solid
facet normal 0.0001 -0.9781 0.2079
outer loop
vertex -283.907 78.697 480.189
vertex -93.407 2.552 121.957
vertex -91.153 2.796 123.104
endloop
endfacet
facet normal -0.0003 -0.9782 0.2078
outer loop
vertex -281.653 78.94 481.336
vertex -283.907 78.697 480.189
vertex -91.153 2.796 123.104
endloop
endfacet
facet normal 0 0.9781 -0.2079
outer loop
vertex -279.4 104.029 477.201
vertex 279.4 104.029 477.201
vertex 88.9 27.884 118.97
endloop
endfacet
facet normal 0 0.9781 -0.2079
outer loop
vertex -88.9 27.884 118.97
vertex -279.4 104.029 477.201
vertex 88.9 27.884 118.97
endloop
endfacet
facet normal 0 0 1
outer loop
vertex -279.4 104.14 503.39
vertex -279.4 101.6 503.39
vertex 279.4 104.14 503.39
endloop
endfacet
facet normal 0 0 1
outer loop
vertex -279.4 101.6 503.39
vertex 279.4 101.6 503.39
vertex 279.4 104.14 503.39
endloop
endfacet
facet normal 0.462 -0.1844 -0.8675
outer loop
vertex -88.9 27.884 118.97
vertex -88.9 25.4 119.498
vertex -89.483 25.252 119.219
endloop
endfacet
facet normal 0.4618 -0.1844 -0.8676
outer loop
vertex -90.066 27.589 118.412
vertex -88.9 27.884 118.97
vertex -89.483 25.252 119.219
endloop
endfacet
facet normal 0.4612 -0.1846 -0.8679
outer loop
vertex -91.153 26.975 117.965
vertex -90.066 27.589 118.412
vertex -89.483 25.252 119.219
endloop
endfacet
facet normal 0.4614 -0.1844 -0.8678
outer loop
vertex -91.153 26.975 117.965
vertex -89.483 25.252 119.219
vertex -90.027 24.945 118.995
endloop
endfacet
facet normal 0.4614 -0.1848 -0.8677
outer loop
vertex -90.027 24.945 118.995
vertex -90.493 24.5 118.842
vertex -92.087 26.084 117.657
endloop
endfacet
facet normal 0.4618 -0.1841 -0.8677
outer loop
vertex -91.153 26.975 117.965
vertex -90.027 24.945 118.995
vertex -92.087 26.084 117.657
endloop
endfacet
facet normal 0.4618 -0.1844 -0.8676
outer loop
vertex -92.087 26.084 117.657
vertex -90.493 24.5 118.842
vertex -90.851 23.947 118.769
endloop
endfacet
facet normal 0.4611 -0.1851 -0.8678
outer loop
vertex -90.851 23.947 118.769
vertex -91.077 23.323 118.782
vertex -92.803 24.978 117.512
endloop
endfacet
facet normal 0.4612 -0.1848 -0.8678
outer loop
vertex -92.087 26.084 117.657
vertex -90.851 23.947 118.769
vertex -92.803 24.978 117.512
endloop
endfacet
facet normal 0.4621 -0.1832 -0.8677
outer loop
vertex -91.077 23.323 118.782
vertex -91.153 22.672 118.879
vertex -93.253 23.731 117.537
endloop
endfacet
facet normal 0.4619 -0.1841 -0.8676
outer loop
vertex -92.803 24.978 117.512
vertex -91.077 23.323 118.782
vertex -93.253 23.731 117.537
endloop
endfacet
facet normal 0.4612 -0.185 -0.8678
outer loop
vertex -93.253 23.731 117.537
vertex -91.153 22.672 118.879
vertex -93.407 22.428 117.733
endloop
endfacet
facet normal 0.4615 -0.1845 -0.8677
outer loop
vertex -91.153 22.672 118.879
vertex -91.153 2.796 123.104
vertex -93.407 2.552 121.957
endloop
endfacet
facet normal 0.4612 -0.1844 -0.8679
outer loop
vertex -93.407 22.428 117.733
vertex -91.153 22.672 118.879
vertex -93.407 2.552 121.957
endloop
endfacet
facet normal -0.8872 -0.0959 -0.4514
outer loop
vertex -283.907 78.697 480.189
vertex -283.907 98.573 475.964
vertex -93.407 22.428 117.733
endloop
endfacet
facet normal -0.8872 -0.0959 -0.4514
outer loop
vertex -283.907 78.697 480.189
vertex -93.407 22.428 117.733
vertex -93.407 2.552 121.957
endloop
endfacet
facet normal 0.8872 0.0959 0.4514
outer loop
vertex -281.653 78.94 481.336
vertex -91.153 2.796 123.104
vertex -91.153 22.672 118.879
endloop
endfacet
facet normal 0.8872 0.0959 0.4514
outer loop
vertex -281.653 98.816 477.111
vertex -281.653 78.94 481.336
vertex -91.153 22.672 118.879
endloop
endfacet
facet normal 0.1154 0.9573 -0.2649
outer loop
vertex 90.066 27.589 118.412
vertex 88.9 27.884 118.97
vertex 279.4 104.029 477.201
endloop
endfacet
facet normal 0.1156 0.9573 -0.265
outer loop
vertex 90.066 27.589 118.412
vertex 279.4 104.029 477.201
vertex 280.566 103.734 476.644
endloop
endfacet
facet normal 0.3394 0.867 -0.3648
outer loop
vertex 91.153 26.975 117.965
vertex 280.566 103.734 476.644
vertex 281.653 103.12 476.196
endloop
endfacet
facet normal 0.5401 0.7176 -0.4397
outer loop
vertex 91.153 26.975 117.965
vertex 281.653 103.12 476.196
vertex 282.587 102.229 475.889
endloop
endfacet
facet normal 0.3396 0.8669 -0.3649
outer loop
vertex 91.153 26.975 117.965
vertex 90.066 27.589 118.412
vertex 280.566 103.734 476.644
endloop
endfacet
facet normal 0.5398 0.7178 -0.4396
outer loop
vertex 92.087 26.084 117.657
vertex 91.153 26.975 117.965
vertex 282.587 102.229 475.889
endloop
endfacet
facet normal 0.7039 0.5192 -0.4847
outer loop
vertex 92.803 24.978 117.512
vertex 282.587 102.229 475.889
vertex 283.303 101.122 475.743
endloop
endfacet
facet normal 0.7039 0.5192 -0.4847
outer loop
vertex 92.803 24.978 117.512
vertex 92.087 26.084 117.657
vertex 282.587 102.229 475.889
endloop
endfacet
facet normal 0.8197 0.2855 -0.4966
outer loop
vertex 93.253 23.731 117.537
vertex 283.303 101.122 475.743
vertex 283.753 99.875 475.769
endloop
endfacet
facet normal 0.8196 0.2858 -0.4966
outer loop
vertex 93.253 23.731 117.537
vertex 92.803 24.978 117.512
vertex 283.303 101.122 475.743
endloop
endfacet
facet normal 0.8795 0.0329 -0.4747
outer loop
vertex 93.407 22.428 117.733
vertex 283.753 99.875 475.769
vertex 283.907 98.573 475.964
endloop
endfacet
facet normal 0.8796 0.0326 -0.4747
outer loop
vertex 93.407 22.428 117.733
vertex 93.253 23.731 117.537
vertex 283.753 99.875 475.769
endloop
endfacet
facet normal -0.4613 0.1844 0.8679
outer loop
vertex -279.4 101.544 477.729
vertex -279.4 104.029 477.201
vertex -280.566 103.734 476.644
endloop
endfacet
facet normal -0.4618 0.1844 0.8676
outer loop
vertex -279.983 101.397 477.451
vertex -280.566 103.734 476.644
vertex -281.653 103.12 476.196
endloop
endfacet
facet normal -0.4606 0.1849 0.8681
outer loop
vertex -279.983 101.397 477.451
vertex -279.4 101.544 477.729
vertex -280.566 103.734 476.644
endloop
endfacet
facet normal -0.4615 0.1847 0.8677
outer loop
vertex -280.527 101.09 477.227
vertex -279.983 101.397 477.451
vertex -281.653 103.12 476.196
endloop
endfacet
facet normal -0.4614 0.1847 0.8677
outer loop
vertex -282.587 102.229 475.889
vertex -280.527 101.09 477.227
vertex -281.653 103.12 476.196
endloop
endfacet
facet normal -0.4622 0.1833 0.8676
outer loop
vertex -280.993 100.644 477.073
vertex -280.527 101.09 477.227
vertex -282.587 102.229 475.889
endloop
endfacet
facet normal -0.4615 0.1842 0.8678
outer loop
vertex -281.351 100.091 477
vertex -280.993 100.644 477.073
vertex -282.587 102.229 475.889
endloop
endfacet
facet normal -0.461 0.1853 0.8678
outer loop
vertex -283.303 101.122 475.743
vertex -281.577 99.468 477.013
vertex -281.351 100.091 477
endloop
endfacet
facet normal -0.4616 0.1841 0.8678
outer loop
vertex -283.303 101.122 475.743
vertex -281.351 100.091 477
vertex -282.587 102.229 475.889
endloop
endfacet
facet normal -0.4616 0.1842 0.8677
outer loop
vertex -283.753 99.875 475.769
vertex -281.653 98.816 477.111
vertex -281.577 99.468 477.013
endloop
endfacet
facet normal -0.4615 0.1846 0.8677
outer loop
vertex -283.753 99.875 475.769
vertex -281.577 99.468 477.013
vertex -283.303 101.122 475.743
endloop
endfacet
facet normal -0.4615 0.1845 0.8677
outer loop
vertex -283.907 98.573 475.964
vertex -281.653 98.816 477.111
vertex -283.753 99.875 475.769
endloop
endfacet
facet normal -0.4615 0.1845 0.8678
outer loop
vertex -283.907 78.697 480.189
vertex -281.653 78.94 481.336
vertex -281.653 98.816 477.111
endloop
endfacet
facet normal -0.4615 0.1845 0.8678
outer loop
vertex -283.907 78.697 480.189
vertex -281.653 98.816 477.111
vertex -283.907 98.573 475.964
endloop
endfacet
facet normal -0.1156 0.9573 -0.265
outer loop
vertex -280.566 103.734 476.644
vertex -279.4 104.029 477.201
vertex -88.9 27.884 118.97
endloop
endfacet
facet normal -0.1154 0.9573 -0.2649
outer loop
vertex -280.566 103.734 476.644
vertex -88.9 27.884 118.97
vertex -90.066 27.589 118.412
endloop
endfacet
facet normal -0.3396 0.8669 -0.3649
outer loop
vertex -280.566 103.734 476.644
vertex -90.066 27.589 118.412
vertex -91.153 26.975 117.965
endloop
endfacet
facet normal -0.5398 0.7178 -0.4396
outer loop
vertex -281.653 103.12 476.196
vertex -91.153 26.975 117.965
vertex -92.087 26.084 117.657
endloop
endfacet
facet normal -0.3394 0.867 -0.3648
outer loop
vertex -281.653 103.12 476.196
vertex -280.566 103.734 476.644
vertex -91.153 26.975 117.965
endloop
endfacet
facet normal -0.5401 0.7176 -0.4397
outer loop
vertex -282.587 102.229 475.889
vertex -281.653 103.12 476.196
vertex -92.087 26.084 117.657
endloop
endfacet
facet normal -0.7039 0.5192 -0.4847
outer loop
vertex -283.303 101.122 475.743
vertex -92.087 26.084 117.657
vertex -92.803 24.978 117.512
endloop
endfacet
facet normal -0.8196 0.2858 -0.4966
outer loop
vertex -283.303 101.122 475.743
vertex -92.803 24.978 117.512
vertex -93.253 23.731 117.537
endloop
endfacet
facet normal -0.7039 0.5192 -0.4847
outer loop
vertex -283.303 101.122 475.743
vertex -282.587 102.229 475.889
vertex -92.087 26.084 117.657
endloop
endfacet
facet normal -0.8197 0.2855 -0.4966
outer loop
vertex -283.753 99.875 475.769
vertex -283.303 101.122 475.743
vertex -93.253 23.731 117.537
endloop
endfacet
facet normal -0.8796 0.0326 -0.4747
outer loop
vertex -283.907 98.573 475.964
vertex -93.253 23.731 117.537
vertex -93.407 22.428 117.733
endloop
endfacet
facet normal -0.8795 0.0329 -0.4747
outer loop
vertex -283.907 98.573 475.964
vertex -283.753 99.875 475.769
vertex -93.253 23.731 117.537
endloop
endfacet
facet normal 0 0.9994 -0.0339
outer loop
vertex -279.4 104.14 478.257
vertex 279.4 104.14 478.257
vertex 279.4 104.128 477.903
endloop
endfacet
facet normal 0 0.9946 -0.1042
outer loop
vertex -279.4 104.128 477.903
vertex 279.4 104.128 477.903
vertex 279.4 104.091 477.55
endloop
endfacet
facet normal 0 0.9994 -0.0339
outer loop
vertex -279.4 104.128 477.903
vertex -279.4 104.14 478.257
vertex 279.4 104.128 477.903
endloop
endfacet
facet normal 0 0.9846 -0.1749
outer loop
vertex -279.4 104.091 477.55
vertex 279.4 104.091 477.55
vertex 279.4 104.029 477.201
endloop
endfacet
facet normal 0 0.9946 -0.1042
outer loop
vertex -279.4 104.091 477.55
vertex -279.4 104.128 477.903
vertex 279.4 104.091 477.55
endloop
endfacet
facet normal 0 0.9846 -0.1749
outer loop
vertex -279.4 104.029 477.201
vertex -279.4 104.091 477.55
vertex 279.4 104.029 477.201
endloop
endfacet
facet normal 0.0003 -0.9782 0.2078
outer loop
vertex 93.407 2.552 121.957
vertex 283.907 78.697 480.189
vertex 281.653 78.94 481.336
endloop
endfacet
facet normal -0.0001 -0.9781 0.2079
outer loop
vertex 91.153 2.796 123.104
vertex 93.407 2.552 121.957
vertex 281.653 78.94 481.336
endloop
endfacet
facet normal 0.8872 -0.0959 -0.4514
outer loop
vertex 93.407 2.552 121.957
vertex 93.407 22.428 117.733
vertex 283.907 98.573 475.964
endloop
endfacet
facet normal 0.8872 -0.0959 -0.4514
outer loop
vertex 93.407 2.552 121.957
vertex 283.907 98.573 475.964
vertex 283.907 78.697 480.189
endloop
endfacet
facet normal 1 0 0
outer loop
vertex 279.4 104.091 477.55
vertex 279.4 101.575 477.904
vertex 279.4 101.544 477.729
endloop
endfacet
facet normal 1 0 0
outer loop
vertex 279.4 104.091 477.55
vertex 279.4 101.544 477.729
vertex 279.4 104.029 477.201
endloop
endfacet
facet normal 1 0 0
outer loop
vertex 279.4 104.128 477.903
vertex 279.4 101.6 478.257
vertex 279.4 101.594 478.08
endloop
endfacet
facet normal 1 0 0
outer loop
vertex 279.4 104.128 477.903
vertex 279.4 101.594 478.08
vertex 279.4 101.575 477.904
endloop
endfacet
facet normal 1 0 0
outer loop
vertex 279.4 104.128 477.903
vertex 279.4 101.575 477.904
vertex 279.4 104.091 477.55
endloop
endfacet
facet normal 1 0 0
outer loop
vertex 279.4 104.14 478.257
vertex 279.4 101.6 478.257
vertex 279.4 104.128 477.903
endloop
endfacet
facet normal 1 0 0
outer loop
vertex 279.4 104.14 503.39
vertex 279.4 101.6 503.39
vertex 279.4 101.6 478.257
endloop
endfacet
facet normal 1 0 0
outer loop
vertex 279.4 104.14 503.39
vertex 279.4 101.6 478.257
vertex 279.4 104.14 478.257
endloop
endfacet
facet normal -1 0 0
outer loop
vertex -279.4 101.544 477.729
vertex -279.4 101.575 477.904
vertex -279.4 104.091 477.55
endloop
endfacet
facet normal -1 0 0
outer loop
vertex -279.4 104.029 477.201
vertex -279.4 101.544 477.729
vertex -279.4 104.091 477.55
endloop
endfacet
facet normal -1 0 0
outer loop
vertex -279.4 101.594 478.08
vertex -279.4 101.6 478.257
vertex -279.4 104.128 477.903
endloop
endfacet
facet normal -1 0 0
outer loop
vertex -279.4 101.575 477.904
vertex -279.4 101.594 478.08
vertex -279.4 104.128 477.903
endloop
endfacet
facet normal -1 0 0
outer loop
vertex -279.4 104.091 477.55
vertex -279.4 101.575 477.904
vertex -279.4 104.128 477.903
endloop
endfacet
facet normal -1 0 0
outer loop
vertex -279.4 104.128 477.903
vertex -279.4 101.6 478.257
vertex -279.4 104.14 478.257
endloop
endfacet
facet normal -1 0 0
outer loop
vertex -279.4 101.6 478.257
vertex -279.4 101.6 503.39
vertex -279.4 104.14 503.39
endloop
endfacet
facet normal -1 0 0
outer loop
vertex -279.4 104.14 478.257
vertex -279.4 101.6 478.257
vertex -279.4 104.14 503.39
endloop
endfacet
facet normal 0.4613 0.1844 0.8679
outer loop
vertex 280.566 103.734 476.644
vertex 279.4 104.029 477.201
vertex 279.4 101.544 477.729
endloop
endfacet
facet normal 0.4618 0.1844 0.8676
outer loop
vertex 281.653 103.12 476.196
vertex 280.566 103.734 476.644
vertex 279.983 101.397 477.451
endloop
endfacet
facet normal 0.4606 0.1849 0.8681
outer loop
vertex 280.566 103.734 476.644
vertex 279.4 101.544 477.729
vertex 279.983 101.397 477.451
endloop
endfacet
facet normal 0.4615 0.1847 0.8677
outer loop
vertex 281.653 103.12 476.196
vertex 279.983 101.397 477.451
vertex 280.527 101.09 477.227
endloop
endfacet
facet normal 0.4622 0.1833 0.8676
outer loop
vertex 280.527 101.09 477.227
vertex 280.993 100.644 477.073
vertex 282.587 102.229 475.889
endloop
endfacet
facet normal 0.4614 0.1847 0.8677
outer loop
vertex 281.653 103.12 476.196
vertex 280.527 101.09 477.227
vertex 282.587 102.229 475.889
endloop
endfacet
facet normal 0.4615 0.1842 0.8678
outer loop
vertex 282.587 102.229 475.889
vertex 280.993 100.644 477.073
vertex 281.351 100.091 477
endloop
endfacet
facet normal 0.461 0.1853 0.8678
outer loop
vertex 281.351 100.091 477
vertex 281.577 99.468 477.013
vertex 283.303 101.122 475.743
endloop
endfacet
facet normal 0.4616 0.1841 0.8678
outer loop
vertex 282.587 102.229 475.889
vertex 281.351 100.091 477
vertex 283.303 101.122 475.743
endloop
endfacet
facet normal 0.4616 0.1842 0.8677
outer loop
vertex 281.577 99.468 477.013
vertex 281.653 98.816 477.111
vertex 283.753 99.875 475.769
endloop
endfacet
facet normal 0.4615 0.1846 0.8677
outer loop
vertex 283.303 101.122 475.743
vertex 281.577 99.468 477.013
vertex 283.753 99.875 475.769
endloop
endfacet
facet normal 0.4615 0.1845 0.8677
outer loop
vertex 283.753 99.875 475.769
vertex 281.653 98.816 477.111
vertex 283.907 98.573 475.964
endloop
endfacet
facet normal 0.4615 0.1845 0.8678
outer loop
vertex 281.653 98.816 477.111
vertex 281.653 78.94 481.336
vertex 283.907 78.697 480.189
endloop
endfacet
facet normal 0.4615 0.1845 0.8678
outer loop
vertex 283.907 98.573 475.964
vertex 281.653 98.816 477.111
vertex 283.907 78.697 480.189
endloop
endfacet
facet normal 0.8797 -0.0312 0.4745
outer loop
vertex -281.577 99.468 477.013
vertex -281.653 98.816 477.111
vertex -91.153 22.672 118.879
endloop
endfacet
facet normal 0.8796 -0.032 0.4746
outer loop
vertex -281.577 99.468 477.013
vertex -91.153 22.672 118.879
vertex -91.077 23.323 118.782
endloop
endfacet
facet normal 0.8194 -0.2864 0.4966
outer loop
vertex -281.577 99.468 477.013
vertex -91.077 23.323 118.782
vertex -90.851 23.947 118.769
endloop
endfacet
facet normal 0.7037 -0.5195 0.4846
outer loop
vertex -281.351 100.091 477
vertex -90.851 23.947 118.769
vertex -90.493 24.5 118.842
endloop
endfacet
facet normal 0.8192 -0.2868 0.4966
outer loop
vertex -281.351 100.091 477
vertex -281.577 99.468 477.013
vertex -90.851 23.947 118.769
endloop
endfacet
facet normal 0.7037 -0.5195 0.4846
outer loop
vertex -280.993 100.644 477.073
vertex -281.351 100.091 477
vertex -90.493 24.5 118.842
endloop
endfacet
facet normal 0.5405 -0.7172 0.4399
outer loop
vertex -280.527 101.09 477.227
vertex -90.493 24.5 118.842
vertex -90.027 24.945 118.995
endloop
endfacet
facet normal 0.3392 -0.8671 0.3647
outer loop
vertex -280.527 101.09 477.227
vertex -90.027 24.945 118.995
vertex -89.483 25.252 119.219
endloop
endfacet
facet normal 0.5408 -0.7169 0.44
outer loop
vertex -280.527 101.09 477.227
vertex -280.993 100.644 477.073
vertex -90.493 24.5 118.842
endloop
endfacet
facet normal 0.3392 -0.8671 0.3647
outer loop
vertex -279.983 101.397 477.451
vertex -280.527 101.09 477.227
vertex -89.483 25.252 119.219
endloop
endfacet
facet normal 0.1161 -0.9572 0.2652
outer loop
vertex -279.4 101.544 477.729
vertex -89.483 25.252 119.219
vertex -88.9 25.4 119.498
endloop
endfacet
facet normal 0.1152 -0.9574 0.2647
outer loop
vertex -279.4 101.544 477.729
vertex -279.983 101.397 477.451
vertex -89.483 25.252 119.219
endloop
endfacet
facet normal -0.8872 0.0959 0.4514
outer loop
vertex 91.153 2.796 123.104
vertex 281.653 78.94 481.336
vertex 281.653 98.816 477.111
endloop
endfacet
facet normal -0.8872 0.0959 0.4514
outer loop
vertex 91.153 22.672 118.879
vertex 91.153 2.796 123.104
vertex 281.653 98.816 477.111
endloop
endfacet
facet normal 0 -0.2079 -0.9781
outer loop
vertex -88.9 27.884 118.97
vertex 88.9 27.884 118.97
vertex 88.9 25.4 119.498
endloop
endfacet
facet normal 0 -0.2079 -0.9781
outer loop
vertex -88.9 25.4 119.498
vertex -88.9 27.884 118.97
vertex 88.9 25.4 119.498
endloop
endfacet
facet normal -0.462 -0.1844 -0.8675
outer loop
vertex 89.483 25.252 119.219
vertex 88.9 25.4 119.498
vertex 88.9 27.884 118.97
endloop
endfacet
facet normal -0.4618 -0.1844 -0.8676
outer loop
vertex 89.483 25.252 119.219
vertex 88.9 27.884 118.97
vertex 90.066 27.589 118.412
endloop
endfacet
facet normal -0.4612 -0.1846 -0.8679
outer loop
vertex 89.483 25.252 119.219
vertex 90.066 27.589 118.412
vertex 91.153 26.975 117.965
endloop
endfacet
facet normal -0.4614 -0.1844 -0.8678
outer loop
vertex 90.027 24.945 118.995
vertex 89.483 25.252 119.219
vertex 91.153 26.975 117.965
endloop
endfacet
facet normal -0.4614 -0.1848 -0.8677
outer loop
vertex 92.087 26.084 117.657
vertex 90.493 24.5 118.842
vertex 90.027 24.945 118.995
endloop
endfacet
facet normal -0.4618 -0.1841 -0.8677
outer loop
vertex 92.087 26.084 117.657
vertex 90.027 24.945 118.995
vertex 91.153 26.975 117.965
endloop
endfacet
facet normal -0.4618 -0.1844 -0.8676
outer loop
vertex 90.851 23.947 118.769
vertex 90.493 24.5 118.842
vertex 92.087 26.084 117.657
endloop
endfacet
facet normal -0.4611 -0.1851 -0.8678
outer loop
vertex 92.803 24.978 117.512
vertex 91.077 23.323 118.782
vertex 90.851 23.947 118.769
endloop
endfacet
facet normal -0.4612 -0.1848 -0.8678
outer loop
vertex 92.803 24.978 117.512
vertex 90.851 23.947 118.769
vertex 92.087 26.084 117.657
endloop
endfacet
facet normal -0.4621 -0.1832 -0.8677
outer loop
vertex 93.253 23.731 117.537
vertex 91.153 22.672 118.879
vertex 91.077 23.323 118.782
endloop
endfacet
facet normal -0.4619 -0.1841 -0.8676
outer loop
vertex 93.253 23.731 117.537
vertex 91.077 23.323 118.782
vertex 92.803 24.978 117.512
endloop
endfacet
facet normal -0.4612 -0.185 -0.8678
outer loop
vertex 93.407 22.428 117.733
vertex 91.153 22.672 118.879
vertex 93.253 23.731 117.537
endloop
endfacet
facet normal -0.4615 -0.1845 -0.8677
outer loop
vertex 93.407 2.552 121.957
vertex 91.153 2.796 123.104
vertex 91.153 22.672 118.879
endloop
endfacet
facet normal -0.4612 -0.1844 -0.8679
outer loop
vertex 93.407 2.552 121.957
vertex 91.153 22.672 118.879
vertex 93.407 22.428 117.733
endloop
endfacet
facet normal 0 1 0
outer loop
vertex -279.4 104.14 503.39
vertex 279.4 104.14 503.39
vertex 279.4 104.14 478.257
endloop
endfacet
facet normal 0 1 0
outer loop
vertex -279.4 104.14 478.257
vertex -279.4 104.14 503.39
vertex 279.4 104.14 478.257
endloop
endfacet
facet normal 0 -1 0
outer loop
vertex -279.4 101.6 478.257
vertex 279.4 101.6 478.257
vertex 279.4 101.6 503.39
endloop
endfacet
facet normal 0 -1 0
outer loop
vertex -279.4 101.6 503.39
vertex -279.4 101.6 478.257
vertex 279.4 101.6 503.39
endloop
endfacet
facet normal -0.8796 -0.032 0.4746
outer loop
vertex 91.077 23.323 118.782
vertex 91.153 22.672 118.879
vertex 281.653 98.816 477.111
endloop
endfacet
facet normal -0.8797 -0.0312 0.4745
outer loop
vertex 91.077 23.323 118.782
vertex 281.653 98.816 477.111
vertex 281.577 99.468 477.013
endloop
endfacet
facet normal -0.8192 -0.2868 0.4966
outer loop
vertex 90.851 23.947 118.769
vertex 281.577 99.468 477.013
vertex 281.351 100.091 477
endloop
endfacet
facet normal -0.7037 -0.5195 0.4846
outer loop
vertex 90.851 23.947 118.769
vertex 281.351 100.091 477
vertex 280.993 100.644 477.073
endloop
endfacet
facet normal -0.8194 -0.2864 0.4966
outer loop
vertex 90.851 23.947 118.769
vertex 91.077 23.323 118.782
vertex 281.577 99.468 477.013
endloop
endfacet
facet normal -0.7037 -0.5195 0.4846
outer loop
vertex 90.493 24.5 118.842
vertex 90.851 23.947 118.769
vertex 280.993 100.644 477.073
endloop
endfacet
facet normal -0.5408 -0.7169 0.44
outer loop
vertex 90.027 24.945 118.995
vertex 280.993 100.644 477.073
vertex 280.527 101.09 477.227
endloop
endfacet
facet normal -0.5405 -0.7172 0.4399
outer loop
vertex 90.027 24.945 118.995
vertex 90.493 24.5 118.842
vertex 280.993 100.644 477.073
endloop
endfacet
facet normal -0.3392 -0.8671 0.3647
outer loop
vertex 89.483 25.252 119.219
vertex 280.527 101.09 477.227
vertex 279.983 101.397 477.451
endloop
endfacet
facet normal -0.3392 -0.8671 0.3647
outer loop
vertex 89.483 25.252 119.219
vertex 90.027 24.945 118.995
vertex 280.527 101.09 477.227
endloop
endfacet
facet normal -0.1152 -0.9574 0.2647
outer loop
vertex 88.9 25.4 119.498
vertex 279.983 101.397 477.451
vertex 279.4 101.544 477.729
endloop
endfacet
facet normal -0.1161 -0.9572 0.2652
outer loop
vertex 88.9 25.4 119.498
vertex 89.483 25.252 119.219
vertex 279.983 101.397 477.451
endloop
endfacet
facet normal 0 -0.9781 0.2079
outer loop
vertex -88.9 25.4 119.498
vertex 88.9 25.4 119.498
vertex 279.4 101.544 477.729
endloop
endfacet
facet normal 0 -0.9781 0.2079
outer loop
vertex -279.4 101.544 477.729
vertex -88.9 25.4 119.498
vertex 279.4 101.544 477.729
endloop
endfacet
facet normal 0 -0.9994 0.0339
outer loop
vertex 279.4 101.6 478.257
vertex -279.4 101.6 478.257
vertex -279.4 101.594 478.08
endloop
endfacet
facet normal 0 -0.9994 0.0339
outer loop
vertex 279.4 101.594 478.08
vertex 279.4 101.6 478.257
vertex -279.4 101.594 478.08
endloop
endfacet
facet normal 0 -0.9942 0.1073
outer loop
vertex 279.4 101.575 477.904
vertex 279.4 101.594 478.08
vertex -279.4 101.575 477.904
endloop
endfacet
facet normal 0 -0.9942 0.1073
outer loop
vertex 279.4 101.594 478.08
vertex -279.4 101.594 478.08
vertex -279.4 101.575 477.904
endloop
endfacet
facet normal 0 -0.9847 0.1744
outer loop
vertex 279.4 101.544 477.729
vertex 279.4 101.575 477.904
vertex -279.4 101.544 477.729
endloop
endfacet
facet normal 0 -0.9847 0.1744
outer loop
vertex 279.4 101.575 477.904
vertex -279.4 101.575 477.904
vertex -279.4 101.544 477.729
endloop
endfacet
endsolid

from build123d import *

# Parameters (mm, degrees)
BOSS_EXTRUDE1_DEPTH     = 279.4
CONVERT_SOLID1_START    = -279.4
CONVERT_SOLID1_DEPTH    = 558.8
CONVERT_SOLID1_2_DEPTH  = 558.8
CUT_EXTRUDE1_DEPTH      = 586.091506768
EDGE_FLANGE1_DEPTH      = 412.817360463
EDGE_FLANGE1_BEND_DEPTH = 412.817360463
CUT_EXTRUDE2_DEPTH      = 588.256983898
CUT_EXTRUDE2_DEPTH_BACK = 588.256983898
SKETCH12_R              = 7.9375


# Read off the part's stored shape, not the designer's step: Convert-Solid1
# Sheet-metal steps are written as plain solids
with BuildPart() as part:
    # Sketch3 → Boss-Extrude1 (new, symmetric)
    with BuildSketch(Plane(origin=(0, 0, 0), x_dir=(0, 0, -1), z_dir=(1, 0, 0))):
        Polygon((-477.990419123, 101.6), (-503.390419123, 101.6), (-503.390419123, 104.14), (-477.723454365, 104.14), (-118.969509086, 27.884494906), (-119.497604781, 25.4), align=None)
    extrude(amount=BOSS_EXTRUDE1_DEPTH, both=True)

    # Convert-Solid1 outline → Convert-Solid1 (cut)
    with BuildSketch(Plane.YZ.offset(CONVERT_SOLID1_START)):
        with BuildLine():
            Line((104.14, 477.723454365), (104.14, 478.257383881))
            ThreePointArc((104.14, 478.257383881), (104.112171228, 477.726379287), (104.028989812, 477.201192491))
            Line((104.028989812, 477.201192491), (104.14, 477.723454365))
        make_face()
    extrude(amount=CONVERT_SOLID1_DEPTH, mode=Mode.SUBTRACT)

    # Convert-Solid1 2 outline → Convert-Solid1 2 (add)
    with BuildSketch(Plane.YZ.offset(CONVERT_SOLID1_START)):
        with BuildLine():
            Line((101.6, 477.990419123), (101.6, 478.257383881))
            ThreePointArc((101.6, 478.257383881), (101.586085614, 477.991881584), (101.544494906, 477.729288186))
            Line((101.544494906, 477.729288186), (101.6, 477.990419123))
        make_face()
    extrude(amount=CONVERT_SOLID1_2_DEPTH)

    # Sketch8 → Cut-Extrude1 (cut, through all)
    with BuildSketch(Plane(origin=(0, 2.484494906, -0.528095695), x_dir=(1, 0, 0), z_dir=(0, 0.9781476007338071, -0.2079116908177526))):
        Polygon((279.4, -488.402044668), (88.9, -122.167252357), (279.4, -122.167252357), align=None)
        Polygon((-88.9, -122.167252357), (-279.4, -488.402044668), (-279.4, -122.167252357), align=None)
    extrude(amount=-CUT_EXTRUDE1_DEPTH, mode=Mode.SUBTRACT)

    # Edge-Flange1 section (across the edge) → Edge-Flange1 (add)
    with BuildSketch(Plane(origin=(91.153384818, 25.156303297, 118.351101933), x_dir=(-0.8871593769725213, 0.09594358400127492, 0.4513790741037053), z_dir=(0.4614631511288068, 0.18445080609118078, 0.8677728160541709))):
        with BuildLine():
            Line((-2.54, 2.54), (-2.54, 22.86))
            Line((-2.54, 22.86), (0, 22.86))
            Line((0, 22.86), (0, 2.54))
            ThreePointArc((0, 2.54), (0.743948776, 0.743948776), (2.54, 0))
            Line((2.54, 0), (2.54, -2.54))
            ThreePointArc((2.54, -2.54), (-1.052102448, -1.052102448), (-2.54, 2.54))
        make_face()
    extrude(amount=EDGE_FLANGE1_DEPTH)

    # Edge-Flange1 section 2 (across the edge) → Edge-Flange1 bend (add)
    with BuildSketch(Plane(origin=(-281.653384818, 101.300798203, 476.582785338), x_dir=(0.8871593769725281, 0.09594358400127215, 0.45137907410369243), z_dir=(0.4614631511287936, -0.18445080609118217, -0.8677728160541774))):
        with BuildLine():
            Line((-2.54, 2.54), (-2.54, 22.86))
            Line((-2.54, 22.86), (0, 22.86))
            Line((0, 22.86), (0, 2.54))
            ThreePointArc((0, 2.54), (0.743948776, 0.743948776), (2.54, 0))
            Line((2.54, 0), (2.54, -2.54))
            ThreePointArc((2.54, -2.54), (-1.052102448, -1.052102448), (-2.54, 2.54))
        make_face()
    extrude(amount=EDGE_FLANGE1_BEND_DEPTH)

    # Sketch12 → Cut-Extrude2 (cut, two sides: drawn at the far end of the back side and taken through both)
    with BuildSketch(Plane(origin=(0, 2.484494906, -0.528095695), x_dir=(1, 0, 0), z_dir=(0, 0.9781476007338071, -0.2079116908177526)).offset(-CUT_EXTRUDE2_DEPTH_BACK)):
        with Locations((-20.371926238, 129.188925745)):
            Circle(SKETCH12_R)
        with Locations((120.282042226, -141.217252357)):
            Circle(SKETCH12_R)
    cut_extrude2 = extrude(amount=CUT_EXTRUDE2_DEPTH + CUT_EXTRUDE2_DEPTH_BACK, mode=Mode.SUBTRACT)

    # Mirror8: Cut-Extrude2 across plane
    add(cut_extrude2.mirror(Plane(origin=(0, 0, 0), x_dir=(0, 0, 1), z_dir=(1, 0, 0))), mode=Mode.SUBTRACT)


solid = part.part
